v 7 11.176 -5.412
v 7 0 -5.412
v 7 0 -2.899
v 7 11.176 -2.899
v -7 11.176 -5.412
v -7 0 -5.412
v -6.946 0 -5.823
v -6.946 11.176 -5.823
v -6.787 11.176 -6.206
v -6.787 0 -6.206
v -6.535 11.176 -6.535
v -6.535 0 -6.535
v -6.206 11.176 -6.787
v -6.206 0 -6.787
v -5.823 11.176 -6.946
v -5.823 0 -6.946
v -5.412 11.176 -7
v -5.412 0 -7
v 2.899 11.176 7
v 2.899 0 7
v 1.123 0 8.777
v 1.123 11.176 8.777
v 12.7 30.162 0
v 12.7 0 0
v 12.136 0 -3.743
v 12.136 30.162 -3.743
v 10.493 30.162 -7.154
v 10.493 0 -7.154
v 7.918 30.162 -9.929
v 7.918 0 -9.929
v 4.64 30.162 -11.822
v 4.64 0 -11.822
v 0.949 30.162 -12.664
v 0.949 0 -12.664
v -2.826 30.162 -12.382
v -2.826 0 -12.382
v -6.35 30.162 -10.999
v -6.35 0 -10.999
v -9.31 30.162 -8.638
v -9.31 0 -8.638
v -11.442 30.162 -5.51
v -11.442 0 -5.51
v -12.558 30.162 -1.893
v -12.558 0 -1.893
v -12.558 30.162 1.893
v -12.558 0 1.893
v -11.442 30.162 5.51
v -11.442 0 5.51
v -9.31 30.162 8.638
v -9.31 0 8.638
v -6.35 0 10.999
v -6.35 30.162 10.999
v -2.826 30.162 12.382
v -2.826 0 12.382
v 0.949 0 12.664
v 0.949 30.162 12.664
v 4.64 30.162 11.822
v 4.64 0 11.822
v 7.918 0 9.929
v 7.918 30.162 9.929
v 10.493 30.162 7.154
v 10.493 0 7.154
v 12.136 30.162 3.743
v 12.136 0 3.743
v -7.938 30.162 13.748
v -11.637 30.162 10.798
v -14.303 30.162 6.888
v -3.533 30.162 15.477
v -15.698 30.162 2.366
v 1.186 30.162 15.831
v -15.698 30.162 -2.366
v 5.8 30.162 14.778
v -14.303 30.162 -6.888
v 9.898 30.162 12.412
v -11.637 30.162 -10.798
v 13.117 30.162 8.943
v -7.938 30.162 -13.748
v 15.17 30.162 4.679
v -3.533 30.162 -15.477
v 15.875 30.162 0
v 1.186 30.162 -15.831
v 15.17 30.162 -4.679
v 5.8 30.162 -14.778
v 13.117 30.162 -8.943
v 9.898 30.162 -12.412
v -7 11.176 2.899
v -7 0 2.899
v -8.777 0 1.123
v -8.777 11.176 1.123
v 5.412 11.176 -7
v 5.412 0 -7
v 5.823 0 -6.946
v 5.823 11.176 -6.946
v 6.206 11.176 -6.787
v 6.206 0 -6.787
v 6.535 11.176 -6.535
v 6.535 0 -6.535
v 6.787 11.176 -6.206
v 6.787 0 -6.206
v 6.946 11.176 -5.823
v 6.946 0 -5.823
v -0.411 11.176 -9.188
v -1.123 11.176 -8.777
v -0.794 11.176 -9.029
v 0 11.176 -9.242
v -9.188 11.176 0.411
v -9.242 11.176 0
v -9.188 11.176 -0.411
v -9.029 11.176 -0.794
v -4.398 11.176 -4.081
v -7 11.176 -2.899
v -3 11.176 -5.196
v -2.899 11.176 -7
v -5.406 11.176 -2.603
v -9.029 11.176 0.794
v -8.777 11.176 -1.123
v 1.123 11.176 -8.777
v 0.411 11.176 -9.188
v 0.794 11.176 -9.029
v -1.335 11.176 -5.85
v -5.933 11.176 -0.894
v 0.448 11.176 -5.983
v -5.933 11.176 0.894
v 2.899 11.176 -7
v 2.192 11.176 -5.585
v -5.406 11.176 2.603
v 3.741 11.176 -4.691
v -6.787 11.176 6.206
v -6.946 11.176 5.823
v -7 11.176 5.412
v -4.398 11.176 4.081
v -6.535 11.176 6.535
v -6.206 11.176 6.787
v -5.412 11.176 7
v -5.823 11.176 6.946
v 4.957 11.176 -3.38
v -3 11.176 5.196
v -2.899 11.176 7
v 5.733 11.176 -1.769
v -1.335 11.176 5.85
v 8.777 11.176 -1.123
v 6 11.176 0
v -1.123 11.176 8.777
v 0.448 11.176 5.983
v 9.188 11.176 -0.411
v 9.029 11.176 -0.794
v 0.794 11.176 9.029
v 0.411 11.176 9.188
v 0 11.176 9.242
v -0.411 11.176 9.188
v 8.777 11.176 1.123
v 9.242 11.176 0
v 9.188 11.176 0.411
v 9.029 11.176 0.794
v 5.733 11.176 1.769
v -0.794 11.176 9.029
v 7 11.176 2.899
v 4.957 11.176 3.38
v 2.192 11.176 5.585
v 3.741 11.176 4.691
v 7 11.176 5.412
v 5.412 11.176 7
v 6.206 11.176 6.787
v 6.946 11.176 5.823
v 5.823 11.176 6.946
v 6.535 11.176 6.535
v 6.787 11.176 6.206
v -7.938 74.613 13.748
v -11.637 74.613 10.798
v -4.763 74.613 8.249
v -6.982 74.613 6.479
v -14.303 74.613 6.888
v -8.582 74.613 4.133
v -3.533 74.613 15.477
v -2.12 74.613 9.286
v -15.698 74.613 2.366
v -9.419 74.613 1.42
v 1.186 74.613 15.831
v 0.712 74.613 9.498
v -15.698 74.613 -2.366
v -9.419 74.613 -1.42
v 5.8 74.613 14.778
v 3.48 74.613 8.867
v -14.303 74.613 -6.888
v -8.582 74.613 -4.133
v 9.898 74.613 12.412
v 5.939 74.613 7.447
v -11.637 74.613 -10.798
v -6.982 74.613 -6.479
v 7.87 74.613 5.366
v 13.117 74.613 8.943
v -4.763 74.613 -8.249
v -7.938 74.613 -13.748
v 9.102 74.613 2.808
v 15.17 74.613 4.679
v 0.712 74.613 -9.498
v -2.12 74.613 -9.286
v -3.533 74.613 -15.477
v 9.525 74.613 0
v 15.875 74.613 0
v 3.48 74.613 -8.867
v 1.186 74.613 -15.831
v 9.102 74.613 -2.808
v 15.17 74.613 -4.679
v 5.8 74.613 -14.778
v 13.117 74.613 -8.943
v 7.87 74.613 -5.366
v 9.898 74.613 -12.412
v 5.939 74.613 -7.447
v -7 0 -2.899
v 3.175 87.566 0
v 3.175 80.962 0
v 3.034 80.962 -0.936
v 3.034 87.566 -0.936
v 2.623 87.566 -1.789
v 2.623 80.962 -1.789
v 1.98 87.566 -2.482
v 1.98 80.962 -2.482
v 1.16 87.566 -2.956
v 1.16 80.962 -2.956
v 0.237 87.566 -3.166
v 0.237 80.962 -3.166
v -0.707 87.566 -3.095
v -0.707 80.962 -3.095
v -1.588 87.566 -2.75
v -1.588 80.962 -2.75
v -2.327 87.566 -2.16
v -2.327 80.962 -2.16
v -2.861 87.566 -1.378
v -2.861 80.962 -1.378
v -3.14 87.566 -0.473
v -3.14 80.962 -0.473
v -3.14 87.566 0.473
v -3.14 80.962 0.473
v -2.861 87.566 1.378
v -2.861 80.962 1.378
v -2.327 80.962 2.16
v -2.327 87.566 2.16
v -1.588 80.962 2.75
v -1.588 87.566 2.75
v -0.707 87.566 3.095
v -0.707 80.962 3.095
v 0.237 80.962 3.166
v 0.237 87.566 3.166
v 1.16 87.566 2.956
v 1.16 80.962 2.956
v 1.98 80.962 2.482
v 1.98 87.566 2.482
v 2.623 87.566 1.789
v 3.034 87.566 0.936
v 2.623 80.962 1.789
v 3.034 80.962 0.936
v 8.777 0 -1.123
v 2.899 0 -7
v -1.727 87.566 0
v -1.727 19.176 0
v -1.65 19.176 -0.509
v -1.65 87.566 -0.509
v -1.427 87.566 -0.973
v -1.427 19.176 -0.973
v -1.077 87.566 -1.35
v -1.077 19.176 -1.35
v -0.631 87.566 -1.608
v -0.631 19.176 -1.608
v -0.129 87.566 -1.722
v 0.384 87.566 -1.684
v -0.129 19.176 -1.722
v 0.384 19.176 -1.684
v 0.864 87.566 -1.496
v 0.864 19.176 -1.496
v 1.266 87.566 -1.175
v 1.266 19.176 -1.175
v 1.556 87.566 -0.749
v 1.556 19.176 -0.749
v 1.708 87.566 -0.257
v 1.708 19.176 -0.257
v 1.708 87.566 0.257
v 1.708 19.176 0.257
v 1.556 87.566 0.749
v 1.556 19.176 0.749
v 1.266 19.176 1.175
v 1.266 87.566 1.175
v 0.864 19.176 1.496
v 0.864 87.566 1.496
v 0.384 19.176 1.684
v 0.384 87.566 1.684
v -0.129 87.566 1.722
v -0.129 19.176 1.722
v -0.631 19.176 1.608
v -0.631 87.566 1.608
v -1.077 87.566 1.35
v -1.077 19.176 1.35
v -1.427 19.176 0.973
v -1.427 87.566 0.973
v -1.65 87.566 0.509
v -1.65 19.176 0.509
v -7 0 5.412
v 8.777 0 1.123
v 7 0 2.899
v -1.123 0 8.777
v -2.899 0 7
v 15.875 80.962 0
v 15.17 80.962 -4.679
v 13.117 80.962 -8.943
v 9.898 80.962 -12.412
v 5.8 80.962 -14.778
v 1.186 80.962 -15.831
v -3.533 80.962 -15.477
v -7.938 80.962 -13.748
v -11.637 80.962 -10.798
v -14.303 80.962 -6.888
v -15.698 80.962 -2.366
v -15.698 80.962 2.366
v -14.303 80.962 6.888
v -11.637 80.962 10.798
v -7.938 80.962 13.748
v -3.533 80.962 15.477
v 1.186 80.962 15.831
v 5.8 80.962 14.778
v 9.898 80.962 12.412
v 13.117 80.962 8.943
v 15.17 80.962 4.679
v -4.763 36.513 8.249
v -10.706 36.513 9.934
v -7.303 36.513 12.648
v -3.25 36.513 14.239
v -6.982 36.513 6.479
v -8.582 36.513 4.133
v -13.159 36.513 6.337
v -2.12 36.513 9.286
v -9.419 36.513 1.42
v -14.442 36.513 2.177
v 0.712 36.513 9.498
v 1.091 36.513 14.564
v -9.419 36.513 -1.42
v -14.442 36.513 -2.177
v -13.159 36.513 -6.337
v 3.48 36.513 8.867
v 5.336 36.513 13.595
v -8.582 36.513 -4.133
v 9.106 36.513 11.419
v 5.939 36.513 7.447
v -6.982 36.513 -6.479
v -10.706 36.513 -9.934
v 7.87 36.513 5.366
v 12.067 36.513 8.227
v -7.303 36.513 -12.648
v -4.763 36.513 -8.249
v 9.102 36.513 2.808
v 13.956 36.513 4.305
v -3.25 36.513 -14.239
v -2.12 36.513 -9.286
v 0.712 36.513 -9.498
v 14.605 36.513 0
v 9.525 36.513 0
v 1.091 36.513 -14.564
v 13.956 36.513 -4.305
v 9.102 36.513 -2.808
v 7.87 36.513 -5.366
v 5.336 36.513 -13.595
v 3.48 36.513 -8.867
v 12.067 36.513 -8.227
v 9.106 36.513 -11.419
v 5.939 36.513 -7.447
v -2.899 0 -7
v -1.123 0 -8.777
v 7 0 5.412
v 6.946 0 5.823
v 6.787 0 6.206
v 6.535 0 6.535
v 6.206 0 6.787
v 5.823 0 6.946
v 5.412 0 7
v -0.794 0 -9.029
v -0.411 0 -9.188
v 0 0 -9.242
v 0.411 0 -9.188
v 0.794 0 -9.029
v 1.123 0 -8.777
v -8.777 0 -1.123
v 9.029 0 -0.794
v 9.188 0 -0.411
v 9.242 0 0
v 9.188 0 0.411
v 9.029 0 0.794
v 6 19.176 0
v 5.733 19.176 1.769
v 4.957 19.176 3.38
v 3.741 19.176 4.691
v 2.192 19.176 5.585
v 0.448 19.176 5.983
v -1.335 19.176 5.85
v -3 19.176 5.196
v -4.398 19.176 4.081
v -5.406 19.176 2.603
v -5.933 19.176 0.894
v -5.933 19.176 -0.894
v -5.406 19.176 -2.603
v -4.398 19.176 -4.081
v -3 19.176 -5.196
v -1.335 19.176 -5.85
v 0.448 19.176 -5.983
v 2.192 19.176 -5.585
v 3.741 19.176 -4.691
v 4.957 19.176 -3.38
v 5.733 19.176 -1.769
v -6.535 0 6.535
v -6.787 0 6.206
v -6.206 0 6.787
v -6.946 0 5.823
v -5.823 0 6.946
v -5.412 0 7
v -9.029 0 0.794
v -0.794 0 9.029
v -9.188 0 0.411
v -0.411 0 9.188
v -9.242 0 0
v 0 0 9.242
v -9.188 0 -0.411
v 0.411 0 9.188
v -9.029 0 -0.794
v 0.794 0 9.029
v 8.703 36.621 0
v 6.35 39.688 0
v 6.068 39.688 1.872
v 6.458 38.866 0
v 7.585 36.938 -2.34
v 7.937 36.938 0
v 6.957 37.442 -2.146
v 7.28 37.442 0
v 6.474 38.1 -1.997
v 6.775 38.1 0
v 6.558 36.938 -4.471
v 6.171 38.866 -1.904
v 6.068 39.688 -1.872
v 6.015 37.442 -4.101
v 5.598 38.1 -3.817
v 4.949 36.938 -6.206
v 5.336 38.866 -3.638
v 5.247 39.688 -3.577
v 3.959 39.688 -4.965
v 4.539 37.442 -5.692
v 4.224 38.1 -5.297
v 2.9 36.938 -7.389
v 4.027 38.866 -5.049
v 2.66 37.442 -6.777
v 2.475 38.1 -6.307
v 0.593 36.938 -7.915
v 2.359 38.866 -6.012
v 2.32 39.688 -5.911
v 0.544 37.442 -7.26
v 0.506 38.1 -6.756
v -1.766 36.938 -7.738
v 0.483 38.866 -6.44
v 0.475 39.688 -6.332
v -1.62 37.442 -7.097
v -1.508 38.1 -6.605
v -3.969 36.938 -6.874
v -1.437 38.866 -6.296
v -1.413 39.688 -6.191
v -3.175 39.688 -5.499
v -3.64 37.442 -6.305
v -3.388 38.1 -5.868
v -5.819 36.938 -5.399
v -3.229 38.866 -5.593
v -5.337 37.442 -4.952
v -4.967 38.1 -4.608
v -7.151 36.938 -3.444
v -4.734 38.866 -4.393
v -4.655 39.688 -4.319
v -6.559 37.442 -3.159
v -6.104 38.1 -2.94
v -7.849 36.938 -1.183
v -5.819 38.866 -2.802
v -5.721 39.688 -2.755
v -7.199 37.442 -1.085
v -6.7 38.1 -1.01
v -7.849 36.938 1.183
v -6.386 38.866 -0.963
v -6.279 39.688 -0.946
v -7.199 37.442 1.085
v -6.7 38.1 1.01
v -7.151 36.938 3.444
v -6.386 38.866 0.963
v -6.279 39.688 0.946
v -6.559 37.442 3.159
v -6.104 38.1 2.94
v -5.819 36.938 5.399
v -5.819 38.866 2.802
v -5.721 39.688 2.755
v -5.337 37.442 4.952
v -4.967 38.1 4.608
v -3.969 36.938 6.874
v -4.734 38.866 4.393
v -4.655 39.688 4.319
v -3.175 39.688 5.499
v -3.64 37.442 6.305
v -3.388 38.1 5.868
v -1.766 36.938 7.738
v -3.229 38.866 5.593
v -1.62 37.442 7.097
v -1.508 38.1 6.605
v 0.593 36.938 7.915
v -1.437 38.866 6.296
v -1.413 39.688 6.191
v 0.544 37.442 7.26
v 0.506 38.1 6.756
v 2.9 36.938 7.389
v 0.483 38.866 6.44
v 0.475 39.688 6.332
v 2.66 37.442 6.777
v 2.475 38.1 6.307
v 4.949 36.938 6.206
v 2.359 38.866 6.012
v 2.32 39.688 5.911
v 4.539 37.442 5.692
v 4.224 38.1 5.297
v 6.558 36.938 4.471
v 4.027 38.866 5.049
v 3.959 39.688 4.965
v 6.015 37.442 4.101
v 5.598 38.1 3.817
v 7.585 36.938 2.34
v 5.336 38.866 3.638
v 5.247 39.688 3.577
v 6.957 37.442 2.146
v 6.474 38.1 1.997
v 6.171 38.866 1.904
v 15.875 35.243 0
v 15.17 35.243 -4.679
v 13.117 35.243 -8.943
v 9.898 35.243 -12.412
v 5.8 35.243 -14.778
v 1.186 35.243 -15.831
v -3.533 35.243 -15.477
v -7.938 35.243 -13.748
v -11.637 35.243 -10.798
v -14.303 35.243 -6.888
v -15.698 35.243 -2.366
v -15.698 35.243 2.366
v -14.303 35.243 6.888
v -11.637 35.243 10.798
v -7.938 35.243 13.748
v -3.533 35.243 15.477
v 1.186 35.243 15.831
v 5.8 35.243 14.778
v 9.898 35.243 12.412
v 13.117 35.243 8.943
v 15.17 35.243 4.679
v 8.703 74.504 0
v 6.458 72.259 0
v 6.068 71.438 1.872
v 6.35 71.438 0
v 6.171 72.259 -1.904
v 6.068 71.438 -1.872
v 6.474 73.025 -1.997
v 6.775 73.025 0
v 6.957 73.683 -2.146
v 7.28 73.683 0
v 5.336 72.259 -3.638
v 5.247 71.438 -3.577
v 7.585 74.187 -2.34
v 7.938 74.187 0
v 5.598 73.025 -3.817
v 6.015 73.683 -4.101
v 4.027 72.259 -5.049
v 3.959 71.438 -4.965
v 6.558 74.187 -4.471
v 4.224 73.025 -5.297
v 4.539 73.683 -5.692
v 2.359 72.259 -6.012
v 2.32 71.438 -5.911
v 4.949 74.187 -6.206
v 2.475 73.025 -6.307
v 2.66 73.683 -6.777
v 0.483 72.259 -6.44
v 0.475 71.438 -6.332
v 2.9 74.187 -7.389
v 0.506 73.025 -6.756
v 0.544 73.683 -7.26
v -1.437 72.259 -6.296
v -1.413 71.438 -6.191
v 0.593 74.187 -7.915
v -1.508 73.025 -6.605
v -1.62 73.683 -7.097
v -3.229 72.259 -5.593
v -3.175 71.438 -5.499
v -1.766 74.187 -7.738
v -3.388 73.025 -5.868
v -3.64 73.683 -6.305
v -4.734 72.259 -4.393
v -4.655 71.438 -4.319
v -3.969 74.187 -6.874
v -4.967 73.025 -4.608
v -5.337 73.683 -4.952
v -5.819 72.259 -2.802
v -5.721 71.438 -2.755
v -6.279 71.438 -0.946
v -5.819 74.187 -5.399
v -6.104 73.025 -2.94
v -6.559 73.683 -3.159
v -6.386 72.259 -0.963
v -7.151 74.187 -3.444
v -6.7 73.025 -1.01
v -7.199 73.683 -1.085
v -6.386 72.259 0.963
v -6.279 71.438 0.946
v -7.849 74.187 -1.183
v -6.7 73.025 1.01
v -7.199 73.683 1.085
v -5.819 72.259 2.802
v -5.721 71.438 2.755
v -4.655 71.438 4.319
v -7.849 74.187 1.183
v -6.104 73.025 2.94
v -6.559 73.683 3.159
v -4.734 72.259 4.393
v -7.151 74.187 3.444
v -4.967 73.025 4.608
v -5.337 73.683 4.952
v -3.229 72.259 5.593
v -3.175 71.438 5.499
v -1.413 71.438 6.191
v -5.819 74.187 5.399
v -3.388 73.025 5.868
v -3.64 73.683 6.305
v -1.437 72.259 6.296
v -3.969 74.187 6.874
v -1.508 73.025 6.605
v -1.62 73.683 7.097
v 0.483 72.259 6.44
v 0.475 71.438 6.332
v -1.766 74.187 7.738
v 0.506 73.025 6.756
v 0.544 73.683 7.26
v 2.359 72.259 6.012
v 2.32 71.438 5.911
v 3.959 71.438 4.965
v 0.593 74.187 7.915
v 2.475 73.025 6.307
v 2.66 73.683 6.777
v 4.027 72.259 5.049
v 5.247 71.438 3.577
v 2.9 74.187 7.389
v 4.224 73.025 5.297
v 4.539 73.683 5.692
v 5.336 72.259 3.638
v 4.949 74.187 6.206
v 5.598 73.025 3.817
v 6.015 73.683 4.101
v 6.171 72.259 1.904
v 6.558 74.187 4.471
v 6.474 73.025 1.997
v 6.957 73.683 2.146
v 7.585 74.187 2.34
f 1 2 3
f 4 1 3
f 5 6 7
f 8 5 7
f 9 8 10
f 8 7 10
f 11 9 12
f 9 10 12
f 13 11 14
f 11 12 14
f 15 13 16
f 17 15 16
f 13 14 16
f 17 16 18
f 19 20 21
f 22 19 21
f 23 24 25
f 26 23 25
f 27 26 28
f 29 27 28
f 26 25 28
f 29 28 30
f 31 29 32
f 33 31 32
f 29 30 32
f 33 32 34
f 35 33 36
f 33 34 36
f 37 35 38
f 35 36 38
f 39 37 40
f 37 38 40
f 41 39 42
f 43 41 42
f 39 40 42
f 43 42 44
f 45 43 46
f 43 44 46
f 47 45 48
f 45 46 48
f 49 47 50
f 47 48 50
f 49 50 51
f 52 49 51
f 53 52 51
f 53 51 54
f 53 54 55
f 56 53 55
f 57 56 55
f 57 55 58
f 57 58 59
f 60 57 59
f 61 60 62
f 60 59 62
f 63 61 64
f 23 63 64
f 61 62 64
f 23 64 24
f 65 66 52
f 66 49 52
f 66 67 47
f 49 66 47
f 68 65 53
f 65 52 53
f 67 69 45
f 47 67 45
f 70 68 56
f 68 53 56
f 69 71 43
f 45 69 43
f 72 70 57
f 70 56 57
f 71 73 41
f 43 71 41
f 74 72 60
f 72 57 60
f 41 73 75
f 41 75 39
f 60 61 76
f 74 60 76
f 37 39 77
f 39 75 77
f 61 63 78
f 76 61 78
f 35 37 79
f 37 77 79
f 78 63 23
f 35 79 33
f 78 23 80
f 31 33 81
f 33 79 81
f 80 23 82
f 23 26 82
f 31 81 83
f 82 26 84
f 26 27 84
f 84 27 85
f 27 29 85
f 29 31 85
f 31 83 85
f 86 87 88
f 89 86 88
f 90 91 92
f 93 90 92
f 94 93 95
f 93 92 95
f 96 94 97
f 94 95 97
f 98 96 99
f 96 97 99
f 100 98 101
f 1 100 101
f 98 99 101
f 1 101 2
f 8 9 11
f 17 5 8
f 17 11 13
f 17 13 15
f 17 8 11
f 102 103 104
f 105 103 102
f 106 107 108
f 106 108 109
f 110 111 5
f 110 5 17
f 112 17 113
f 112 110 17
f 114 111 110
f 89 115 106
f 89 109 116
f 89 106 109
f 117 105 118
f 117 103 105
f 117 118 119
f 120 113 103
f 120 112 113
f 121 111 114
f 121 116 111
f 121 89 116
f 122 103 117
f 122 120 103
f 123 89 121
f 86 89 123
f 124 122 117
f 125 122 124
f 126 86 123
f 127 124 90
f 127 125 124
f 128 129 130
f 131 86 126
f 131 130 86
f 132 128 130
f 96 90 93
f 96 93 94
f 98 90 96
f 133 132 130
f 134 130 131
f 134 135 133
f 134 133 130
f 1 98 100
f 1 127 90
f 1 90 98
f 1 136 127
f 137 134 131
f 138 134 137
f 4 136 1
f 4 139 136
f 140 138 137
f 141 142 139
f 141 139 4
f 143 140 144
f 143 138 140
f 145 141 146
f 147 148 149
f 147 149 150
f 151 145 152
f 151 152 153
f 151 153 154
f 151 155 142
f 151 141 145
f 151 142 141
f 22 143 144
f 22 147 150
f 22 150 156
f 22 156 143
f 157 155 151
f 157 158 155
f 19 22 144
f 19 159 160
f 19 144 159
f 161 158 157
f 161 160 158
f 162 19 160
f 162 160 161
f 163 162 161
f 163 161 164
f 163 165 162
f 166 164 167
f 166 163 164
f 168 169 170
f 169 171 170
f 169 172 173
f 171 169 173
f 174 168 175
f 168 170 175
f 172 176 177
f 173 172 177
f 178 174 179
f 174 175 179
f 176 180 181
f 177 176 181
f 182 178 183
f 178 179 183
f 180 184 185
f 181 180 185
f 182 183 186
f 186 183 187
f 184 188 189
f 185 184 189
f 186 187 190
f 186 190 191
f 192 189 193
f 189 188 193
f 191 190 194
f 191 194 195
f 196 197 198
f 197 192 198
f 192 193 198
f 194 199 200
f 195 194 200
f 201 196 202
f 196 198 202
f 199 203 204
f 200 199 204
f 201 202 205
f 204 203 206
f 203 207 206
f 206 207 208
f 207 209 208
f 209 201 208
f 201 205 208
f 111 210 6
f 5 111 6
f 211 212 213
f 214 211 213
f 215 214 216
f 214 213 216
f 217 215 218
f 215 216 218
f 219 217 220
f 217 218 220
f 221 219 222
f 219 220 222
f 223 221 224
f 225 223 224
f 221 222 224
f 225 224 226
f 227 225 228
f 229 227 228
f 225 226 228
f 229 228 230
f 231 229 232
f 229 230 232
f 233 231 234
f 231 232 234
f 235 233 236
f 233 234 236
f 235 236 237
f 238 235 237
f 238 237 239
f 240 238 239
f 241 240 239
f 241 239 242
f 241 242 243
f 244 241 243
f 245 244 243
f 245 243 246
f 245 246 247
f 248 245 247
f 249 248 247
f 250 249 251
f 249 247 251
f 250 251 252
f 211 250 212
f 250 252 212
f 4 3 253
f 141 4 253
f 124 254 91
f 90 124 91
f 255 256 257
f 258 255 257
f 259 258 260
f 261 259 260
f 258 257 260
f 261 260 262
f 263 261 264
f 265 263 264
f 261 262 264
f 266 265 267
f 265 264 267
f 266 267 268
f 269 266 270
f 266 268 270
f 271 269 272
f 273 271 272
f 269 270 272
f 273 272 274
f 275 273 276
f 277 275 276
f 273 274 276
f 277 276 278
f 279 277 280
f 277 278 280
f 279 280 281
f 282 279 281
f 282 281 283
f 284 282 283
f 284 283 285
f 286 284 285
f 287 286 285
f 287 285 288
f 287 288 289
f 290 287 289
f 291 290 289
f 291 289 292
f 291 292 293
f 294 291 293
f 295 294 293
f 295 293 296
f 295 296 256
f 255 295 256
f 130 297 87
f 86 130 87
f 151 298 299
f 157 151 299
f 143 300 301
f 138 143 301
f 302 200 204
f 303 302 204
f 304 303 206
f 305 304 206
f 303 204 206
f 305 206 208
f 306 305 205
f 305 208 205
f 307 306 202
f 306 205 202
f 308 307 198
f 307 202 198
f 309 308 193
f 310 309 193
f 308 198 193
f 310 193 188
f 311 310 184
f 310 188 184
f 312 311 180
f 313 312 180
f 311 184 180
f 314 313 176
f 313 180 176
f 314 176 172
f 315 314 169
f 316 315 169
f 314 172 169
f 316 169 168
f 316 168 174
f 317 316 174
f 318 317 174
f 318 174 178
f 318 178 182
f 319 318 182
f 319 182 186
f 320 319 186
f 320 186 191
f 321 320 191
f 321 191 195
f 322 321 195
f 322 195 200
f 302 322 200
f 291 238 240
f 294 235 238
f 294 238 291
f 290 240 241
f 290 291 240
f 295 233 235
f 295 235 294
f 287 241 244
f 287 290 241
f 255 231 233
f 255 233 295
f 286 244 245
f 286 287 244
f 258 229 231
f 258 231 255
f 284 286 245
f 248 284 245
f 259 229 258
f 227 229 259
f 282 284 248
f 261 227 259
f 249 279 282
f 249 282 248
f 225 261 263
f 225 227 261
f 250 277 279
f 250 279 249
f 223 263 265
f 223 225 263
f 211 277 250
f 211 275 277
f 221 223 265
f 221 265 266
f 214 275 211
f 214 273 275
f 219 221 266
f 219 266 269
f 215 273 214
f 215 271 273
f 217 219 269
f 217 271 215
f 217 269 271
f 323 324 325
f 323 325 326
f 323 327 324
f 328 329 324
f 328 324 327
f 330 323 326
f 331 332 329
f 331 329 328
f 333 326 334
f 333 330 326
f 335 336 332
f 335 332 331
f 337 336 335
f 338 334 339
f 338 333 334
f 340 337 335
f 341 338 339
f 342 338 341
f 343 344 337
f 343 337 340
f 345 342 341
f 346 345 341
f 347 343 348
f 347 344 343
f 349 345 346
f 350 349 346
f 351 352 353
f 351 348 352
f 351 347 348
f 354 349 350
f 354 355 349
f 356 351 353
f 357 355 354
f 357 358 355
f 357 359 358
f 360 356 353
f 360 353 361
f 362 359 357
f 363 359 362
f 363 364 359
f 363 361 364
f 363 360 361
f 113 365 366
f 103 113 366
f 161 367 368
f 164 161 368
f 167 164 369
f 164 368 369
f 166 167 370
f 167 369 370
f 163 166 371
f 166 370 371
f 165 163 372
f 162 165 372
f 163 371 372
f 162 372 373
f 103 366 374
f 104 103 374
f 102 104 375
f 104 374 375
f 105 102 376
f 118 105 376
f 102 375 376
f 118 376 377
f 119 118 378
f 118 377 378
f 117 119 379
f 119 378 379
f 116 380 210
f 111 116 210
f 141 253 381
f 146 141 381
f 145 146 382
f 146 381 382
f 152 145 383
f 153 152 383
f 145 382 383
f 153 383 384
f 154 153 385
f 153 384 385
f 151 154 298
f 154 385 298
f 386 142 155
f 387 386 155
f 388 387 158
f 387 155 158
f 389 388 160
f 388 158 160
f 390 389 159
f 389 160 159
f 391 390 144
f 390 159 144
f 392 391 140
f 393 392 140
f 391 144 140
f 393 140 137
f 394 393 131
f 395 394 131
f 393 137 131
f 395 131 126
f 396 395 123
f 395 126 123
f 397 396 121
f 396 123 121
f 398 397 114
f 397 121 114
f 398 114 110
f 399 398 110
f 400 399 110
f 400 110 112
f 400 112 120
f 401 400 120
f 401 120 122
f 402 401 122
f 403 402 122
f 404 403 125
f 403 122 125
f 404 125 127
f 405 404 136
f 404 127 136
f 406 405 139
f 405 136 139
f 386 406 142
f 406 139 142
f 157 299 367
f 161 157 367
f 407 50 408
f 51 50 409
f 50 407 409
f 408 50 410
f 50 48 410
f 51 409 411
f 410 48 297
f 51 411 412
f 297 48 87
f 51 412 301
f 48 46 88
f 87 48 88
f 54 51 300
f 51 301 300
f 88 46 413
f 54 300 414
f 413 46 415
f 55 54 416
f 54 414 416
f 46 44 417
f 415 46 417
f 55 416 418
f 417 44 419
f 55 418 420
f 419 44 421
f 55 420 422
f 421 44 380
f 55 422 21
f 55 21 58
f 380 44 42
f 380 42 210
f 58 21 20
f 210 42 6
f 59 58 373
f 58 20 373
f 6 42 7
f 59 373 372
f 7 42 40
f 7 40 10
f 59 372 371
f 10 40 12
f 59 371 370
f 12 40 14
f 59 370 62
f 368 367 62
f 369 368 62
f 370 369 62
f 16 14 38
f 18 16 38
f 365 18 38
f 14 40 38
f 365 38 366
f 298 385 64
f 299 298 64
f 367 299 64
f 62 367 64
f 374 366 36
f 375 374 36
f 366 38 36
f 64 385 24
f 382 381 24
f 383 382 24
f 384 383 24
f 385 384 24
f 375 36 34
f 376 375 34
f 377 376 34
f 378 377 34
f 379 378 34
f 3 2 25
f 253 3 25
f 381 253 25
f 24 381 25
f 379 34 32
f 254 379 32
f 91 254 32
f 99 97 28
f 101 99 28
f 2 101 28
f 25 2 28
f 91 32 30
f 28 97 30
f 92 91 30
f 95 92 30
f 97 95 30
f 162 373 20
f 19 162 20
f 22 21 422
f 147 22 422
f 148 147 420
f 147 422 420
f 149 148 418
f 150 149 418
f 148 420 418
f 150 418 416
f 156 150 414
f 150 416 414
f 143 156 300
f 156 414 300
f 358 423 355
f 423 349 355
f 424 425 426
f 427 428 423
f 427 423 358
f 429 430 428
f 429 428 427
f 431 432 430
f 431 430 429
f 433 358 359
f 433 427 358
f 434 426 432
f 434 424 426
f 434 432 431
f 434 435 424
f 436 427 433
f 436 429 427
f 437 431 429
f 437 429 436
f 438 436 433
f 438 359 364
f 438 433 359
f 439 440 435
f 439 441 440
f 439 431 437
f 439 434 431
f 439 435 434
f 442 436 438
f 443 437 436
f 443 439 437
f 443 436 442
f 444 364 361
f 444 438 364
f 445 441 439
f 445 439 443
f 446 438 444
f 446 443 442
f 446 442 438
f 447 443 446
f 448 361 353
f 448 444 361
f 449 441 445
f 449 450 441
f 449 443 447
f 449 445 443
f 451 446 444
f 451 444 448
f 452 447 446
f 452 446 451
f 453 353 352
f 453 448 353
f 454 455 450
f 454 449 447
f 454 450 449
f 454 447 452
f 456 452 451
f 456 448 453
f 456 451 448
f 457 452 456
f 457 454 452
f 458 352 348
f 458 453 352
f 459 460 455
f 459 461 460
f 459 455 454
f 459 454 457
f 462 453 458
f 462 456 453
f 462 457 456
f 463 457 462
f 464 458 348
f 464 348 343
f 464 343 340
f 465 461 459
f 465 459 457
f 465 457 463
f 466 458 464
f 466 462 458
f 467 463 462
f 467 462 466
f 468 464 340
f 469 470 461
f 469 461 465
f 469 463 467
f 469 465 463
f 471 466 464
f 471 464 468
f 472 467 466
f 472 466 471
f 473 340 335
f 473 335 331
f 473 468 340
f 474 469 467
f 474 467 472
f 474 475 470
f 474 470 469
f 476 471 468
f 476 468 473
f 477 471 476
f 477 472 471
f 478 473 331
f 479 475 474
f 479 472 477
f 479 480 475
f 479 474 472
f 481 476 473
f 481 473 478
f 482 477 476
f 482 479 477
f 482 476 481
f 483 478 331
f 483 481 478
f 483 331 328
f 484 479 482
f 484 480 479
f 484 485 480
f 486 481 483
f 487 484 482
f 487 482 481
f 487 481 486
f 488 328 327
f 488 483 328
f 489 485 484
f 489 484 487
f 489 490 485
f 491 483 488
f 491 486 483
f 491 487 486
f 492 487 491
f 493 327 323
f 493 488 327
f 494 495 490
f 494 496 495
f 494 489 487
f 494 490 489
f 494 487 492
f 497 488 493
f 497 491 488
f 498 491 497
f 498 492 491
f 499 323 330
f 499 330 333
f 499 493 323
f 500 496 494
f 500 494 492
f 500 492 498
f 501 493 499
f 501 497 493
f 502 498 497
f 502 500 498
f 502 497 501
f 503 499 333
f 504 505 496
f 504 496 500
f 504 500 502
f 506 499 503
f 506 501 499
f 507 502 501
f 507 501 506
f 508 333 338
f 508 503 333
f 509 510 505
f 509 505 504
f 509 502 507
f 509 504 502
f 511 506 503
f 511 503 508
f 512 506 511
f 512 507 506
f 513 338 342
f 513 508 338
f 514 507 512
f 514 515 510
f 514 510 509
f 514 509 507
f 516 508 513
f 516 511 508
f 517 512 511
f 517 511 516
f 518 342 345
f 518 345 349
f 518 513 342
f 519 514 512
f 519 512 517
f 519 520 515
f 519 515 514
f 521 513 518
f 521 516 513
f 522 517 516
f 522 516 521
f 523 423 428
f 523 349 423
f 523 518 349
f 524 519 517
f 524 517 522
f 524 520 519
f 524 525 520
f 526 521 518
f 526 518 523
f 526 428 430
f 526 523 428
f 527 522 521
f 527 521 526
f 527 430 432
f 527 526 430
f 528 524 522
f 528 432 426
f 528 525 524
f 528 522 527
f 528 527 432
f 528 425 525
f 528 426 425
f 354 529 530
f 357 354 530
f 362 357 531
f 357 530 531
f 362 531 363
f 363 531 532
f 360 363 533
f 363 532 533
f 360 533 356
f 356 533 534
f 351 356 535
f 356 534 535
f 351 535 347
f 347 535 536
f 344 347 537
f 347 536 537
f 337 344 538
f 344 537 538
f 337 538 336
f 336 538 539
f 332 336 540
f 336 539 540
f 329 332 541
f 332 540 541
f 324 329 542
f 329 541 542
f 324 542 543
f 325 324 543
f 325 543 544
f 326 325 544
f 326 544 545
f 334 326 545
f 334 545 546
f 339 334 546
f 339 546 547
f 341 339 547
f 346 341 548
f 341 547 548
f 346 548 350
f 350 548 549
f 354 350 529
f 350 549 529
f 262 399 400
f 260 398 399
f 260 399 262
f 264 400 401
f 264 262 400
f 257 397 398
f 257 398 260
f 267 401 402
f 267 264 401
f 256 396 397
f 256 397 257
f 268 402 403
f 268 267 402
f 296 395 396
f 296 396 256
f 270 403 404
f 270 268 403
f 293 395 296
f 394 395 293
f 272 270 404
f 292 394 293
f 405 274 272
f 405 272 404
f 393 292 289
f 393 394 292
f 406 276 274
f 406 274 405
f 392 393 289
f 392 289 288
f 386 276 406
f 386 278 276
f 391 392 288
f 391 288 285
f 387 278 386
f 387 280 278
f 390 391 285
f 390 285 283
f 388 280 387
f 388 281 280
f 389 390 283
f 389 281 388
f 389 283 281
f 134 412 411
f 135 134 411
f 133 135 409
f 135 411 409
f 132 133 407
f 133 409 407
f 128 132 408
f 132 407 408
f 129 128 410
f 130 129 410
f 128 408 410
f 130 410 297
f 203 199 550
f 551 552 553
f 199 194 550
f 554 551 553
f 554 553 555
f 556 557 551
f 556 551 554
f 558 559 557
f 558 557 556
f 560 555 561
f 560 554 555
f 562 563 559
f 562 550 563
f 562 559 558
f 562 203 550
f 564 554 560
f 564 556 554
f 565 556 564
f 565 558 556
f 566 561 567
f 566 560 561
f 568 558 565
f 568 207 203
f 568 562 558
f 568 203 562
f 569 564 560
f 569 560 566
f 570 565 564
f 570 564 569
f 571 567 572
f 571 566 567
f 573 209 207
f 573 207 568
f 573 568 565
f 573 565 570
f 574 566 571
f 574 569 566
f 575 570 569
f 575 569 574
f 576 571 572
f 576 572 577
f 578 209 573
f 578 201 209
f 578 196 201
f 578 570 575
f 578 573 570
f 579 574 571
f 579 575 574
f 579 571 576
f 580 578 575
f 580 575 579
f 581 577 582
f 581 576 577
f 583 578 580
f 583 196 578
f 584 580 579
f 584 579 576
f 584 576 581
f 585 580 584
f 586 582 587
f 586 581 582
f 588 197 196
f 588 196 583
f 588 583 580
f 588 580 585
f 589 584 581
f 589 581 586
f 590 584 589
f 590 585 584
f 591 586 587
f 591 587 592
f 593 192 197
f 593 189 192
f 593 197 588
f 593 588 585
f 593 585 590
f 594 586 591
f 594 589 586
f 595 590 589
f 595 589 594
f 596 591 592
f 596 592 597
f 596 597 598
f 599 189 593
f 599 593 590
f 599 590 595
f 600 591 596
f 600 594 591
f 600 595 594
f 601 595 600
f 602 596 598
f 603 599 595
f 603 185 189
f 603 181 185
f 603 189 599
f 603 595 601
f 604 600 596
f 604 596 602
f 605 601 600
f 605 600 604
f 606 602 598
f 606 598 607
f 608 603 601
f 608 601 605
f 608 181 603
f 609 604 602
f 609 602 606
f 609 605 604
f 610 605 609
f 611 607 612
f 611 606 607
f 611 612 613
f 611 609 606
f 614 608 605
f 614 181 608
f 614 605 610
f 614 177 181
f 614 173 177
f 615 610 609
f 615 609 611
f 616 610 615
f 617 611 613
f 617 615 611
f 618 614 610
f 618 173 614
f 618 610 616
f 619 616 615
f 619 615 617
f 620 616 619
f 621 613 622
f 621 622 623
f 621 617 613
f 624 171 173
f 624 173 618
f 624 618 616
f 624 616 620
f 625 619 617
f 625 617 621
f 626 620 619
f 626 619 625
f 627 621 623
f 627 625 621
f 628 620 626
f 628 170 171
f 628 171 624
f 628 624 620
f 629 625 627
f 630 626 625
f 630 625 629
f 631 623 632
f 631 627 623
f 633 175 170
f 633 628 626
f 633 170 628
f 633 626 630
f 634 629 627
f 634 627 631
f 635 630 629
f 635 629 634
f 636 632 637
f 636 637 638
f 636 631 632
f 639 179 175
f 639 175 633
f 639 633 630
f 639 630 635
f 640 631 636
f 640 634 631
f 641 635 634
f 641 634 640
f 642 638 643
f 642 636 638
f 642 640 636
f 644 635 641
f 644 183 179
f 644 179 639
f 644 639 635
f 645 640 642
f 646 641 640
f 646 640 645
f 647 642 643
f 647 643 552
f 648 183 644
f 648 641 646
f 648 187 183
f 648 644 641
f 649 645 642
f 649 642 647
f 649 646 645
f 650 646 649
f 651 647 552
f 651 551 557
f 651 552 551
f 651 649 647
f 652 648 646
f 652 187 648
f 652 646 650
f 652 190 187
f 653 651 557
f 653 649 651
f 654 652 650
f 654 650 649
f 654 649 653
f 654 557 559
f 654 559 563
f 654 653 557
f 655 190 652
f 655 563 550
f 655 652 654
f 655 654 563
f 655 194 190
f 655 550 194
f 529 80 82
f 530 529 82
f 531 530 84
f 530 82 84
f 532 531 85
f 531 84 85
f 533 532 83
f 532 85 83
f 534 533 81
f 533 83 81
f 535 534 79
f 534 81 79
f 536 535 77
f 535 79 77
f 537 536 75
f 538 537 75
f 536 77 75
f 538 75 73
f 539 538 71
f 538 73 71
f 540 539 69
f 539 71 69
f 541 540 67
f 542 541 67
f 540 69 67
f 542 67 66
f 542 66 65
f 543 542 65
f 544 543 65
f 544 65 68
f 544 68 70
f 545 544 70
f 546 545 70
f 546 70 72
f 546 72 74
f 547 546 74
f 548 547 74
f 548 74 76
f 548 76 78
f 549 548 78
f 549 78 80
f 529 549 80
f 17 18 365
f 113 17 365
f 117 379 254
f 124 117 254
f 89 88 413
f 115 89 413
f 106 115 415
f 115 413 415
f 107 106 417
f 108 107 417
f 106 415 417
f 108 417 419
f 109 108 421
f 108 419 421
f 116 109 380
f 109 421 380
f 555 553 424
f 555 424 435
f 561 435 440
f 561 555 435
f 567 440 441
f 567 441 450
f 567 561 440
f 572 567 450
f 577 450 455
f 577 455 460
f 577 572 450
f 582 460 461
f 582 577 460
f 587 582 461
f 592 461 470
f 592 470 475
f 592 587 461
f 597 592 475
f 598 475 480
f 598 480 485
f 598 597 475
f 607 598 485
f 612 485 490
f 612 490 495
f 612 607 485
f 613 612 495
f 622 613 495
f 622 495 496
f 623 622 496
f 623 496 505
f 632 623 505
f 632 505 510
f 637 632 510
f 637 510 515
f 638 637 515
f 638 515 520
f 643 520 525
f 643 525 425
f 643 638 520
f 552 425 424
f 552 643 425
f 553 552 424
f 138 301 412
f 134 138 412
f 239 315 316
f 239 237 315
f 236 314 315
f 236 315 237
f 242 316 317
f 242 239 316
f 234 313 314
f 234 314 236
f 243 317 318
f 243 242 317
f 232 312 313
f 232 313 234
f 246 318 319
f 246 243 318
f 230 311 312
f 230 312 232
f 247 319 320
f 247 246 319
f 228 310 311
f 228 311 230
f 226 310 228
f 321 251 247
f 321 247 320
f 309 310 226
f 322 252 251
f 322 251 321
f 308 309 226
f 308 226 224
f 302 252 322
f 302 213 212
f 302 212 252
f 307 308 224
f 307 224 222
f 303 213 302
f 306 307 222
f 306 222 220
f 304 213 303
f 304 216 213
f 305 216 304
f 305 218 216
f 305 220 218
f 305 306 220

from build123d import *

# Parameters (mm, degrees)
SKETCH1_R             = 12.7
BOSS_EXTRUDE1_DEPTH   = 30.1625
SKETCH4_R             = 15.875
BOSS_EXTRUDE2_DEPTH   = 50.8
CUT_EXTRUDE1_DEPTH    = 11.176
SKETCH3_R             = 6
CUT_EXTRUDE2_DEPTH    = 8
SKETCH5_R             = 3.175
BOSS_EXTRUDE3_DEPTH   = 6.604
F_8_32_TAPPED_HOLE1_D = 3.4544
CUT_EXTRUDE3_START    = -6.35
SKETCH9_R             = 15.875
SKETCH9_R_2           = 6.35
CUT_EXTRUDE3_DEPTH    = 38.1
FILLET1_R             = 3.175
CHAMFER1_SIZE         = 1.27


with BuildPart() as part:
    # Sketch1 → Boss-Extrude1 (new body)
    with BuildSketch(Plane(origin=(0, 0, 0), x_dir=(1, 0, 0), z_dir=(0, 1, 0))):
        Circle(SKETCH1_R)
    extrude(amount=BOSS_EXTRUDE1_DEPTH)

    # Sketch4 → Boss-Extrude2 (add)
    with BuildSketch(Plane(origin=(0, 30.1625, 0), x_dir=(1, 0, 0), z_dir=(0, 1, 0))):
        Circle(SKETCH4_R)
    extrude(amount=BOSS_EXTRUDE2_DEPTH)

    # Sketch2 → Cut-Extrude1 (cut)
    with BuildSketch(Plane.XZ):
        with BuildLine():
            Line((-7, 2.899494937), (-8.776962921, 1.122532015))
            ThreePointArc((-8.776962921, 1.122532015), (-9.241930906, 0), (-8.776962921, -1.122532015))
            Line((-8.776962921, -1.122532015), (-7, -2.899494937))
            Line((-7, -2.899494937), (-7, 2.899494937))
        make_face()
        Polygon((-2.899494937, 7), (-7, 2.899494937), (-7, -2.899494937), (-2.899494937, -7), (2.899494937, -7), (7, -2.899494937), (7, 2.899494937), (2.899494937, 7), align=None)
        with BuildLine():
            Line((-7, 5.4125), (-7, 2.899494937))
            Line((-7, 2.899494937), (-2.899494937, 7))
            Line((-2.899494937, 7), (-5.4125, 7))
            ThreePointArc((-5.4125, 7), (-6.535032015, 6.535032015), (-7, 5.4125))
        make_face()
        with BuildLine():
            Line((-1.122532015, 8.776962921), (-2.899494937, 7))
            Line((-2.899494937, 7), (2.899494937, 7))
            Line((2.899494937, 7), (1.122532015, 8.776962921))
            ThreePointArc((1.122532015, 8.776962921), (0, 9.241930906), (-1.122532015, 8.776962921))
        make_face()
        with BuildLine():
            Line((5.4125, 7), (2.899494937, 7))
            Line((2.899494937, 7), (7, 2.899494937))
            Line((7, 2.899494937), (7, 5.4125))
            ThreePointArc((7, 5.4125), (6.535032015, 6.535032015), (5.4125, 7))
        make_face()
        with BuildLine():
            Line((8.776962921, 1.122532015), (7, 2.899494937))
            Line((7, 2.899494937), (7, -2.899494937))
            Line((7, -2.899494937), (8.776962921, -1.122532015))
            ThreePointArc((8.776962921, -1.122532015), (9.241930906, 0), (8.776962921, 1.122532015))
        make_face()
        with BuildLine():
            Line((7, -2.899494937), (2.899494937, -7))
            Line((2.899494937, -7), (5.4125, -7))
            ThreePointArc((5.4125, -7), (6.535032015, -6.535032015), (7, -5.4125))
            Line((7, -5.4125), (7, -2.899494937))
        make_face()
        with BuildLine():
            Line((2.899494937, -7), (-2.899494937, -7))
            Line((-2.899494937, -7), (-1.122532015, -8.776962921))
            ThreePointArc((-1.122532015, -8.776962921), (0, -9.241930906), (1.122532015, -8.776962921))
            Line((1.122532015, -8.776962921), (2.899494937, -7))
        make_face()
        with BuildLine():
            Line((-2.899494937, -7), (-7, -2.899494937))
            Line((-7, -2.899494937), (-7, -5.4125))
            ThreePointArc((-7, -5.4125), (-6.535032015, -6.535032015), (-5.4125, -7))
            Line((-5.4125, -7), (-2.899494937, -7))
        make_face()
    extrude(amount=-CUT_EXTRUDE1_DEPTH, mode=Mode.SUBTRACT)

    # Sketch3 → Cut-Extrude2 (cut)
    with BuildSketch(Plane.XZ.offset(-11.176)):
        Circle(SKETCH3_R)
    extrude(amount=-CUT_EXTRUDE2_DEPTH, mode=Mode.SUBTRACT)

    # Sketch5 → Boss-Extrude3 (add)
    with BuildSketch(Plane(origin=(0, 80.9625, 0), x_dir=(1, 0, 0), z_dir=(0, 1, 0))):
        Circle(SKETCH5_R)
    extrude(amount=BOSS_EXTRUDE3_DEPTH)

    # #8-32 Tapped Hole1 (through all)
    with Locations(Plane(origin=(0, 87.5665, 0), x_dir=(1, 0, 0), z_dir=(0, 1, 0))):
        with Locations((0, 0)):
            Hole(F_8_32_TAPPED_HOLE1_D / 2)

    # Sketch9 → Cut-Extrude3 (cut)
    with BuildSketch(Plane(origin=(0, 80.9625, 0), x_dir=(1, 0, 0), z_dir=(0, 1, 0)).offset(CUT_EXTRUDE3_START)):
        Circle(SKETCH9_R)
        Circle(SKETCH9_R_2, mode=Mode.SUBTRACT)
    extrude(amount=-CUT_EXTRUDE3_DEPTH, mode=Mode.SUBTRACT)

    # Fillet1
    fillet1_edges = [part.edges().sort_by_distance(p)[0] for p in [
        (-6.35, 36.5125, 0),
        (-6.35, 74.6125, 0),
    ]]
    fillet(fillet1_edges, radius=FILLET1_R)

    # Chamfer1
    chamfer1_edges = [part.edges().sort_by_distance(p)[0] for p in [
        (-15.875, 36.5125, 0),
    ]]
    chamfer(chamfer1_edges, length=CHAMFER1_SIZE)


solid = part.part
